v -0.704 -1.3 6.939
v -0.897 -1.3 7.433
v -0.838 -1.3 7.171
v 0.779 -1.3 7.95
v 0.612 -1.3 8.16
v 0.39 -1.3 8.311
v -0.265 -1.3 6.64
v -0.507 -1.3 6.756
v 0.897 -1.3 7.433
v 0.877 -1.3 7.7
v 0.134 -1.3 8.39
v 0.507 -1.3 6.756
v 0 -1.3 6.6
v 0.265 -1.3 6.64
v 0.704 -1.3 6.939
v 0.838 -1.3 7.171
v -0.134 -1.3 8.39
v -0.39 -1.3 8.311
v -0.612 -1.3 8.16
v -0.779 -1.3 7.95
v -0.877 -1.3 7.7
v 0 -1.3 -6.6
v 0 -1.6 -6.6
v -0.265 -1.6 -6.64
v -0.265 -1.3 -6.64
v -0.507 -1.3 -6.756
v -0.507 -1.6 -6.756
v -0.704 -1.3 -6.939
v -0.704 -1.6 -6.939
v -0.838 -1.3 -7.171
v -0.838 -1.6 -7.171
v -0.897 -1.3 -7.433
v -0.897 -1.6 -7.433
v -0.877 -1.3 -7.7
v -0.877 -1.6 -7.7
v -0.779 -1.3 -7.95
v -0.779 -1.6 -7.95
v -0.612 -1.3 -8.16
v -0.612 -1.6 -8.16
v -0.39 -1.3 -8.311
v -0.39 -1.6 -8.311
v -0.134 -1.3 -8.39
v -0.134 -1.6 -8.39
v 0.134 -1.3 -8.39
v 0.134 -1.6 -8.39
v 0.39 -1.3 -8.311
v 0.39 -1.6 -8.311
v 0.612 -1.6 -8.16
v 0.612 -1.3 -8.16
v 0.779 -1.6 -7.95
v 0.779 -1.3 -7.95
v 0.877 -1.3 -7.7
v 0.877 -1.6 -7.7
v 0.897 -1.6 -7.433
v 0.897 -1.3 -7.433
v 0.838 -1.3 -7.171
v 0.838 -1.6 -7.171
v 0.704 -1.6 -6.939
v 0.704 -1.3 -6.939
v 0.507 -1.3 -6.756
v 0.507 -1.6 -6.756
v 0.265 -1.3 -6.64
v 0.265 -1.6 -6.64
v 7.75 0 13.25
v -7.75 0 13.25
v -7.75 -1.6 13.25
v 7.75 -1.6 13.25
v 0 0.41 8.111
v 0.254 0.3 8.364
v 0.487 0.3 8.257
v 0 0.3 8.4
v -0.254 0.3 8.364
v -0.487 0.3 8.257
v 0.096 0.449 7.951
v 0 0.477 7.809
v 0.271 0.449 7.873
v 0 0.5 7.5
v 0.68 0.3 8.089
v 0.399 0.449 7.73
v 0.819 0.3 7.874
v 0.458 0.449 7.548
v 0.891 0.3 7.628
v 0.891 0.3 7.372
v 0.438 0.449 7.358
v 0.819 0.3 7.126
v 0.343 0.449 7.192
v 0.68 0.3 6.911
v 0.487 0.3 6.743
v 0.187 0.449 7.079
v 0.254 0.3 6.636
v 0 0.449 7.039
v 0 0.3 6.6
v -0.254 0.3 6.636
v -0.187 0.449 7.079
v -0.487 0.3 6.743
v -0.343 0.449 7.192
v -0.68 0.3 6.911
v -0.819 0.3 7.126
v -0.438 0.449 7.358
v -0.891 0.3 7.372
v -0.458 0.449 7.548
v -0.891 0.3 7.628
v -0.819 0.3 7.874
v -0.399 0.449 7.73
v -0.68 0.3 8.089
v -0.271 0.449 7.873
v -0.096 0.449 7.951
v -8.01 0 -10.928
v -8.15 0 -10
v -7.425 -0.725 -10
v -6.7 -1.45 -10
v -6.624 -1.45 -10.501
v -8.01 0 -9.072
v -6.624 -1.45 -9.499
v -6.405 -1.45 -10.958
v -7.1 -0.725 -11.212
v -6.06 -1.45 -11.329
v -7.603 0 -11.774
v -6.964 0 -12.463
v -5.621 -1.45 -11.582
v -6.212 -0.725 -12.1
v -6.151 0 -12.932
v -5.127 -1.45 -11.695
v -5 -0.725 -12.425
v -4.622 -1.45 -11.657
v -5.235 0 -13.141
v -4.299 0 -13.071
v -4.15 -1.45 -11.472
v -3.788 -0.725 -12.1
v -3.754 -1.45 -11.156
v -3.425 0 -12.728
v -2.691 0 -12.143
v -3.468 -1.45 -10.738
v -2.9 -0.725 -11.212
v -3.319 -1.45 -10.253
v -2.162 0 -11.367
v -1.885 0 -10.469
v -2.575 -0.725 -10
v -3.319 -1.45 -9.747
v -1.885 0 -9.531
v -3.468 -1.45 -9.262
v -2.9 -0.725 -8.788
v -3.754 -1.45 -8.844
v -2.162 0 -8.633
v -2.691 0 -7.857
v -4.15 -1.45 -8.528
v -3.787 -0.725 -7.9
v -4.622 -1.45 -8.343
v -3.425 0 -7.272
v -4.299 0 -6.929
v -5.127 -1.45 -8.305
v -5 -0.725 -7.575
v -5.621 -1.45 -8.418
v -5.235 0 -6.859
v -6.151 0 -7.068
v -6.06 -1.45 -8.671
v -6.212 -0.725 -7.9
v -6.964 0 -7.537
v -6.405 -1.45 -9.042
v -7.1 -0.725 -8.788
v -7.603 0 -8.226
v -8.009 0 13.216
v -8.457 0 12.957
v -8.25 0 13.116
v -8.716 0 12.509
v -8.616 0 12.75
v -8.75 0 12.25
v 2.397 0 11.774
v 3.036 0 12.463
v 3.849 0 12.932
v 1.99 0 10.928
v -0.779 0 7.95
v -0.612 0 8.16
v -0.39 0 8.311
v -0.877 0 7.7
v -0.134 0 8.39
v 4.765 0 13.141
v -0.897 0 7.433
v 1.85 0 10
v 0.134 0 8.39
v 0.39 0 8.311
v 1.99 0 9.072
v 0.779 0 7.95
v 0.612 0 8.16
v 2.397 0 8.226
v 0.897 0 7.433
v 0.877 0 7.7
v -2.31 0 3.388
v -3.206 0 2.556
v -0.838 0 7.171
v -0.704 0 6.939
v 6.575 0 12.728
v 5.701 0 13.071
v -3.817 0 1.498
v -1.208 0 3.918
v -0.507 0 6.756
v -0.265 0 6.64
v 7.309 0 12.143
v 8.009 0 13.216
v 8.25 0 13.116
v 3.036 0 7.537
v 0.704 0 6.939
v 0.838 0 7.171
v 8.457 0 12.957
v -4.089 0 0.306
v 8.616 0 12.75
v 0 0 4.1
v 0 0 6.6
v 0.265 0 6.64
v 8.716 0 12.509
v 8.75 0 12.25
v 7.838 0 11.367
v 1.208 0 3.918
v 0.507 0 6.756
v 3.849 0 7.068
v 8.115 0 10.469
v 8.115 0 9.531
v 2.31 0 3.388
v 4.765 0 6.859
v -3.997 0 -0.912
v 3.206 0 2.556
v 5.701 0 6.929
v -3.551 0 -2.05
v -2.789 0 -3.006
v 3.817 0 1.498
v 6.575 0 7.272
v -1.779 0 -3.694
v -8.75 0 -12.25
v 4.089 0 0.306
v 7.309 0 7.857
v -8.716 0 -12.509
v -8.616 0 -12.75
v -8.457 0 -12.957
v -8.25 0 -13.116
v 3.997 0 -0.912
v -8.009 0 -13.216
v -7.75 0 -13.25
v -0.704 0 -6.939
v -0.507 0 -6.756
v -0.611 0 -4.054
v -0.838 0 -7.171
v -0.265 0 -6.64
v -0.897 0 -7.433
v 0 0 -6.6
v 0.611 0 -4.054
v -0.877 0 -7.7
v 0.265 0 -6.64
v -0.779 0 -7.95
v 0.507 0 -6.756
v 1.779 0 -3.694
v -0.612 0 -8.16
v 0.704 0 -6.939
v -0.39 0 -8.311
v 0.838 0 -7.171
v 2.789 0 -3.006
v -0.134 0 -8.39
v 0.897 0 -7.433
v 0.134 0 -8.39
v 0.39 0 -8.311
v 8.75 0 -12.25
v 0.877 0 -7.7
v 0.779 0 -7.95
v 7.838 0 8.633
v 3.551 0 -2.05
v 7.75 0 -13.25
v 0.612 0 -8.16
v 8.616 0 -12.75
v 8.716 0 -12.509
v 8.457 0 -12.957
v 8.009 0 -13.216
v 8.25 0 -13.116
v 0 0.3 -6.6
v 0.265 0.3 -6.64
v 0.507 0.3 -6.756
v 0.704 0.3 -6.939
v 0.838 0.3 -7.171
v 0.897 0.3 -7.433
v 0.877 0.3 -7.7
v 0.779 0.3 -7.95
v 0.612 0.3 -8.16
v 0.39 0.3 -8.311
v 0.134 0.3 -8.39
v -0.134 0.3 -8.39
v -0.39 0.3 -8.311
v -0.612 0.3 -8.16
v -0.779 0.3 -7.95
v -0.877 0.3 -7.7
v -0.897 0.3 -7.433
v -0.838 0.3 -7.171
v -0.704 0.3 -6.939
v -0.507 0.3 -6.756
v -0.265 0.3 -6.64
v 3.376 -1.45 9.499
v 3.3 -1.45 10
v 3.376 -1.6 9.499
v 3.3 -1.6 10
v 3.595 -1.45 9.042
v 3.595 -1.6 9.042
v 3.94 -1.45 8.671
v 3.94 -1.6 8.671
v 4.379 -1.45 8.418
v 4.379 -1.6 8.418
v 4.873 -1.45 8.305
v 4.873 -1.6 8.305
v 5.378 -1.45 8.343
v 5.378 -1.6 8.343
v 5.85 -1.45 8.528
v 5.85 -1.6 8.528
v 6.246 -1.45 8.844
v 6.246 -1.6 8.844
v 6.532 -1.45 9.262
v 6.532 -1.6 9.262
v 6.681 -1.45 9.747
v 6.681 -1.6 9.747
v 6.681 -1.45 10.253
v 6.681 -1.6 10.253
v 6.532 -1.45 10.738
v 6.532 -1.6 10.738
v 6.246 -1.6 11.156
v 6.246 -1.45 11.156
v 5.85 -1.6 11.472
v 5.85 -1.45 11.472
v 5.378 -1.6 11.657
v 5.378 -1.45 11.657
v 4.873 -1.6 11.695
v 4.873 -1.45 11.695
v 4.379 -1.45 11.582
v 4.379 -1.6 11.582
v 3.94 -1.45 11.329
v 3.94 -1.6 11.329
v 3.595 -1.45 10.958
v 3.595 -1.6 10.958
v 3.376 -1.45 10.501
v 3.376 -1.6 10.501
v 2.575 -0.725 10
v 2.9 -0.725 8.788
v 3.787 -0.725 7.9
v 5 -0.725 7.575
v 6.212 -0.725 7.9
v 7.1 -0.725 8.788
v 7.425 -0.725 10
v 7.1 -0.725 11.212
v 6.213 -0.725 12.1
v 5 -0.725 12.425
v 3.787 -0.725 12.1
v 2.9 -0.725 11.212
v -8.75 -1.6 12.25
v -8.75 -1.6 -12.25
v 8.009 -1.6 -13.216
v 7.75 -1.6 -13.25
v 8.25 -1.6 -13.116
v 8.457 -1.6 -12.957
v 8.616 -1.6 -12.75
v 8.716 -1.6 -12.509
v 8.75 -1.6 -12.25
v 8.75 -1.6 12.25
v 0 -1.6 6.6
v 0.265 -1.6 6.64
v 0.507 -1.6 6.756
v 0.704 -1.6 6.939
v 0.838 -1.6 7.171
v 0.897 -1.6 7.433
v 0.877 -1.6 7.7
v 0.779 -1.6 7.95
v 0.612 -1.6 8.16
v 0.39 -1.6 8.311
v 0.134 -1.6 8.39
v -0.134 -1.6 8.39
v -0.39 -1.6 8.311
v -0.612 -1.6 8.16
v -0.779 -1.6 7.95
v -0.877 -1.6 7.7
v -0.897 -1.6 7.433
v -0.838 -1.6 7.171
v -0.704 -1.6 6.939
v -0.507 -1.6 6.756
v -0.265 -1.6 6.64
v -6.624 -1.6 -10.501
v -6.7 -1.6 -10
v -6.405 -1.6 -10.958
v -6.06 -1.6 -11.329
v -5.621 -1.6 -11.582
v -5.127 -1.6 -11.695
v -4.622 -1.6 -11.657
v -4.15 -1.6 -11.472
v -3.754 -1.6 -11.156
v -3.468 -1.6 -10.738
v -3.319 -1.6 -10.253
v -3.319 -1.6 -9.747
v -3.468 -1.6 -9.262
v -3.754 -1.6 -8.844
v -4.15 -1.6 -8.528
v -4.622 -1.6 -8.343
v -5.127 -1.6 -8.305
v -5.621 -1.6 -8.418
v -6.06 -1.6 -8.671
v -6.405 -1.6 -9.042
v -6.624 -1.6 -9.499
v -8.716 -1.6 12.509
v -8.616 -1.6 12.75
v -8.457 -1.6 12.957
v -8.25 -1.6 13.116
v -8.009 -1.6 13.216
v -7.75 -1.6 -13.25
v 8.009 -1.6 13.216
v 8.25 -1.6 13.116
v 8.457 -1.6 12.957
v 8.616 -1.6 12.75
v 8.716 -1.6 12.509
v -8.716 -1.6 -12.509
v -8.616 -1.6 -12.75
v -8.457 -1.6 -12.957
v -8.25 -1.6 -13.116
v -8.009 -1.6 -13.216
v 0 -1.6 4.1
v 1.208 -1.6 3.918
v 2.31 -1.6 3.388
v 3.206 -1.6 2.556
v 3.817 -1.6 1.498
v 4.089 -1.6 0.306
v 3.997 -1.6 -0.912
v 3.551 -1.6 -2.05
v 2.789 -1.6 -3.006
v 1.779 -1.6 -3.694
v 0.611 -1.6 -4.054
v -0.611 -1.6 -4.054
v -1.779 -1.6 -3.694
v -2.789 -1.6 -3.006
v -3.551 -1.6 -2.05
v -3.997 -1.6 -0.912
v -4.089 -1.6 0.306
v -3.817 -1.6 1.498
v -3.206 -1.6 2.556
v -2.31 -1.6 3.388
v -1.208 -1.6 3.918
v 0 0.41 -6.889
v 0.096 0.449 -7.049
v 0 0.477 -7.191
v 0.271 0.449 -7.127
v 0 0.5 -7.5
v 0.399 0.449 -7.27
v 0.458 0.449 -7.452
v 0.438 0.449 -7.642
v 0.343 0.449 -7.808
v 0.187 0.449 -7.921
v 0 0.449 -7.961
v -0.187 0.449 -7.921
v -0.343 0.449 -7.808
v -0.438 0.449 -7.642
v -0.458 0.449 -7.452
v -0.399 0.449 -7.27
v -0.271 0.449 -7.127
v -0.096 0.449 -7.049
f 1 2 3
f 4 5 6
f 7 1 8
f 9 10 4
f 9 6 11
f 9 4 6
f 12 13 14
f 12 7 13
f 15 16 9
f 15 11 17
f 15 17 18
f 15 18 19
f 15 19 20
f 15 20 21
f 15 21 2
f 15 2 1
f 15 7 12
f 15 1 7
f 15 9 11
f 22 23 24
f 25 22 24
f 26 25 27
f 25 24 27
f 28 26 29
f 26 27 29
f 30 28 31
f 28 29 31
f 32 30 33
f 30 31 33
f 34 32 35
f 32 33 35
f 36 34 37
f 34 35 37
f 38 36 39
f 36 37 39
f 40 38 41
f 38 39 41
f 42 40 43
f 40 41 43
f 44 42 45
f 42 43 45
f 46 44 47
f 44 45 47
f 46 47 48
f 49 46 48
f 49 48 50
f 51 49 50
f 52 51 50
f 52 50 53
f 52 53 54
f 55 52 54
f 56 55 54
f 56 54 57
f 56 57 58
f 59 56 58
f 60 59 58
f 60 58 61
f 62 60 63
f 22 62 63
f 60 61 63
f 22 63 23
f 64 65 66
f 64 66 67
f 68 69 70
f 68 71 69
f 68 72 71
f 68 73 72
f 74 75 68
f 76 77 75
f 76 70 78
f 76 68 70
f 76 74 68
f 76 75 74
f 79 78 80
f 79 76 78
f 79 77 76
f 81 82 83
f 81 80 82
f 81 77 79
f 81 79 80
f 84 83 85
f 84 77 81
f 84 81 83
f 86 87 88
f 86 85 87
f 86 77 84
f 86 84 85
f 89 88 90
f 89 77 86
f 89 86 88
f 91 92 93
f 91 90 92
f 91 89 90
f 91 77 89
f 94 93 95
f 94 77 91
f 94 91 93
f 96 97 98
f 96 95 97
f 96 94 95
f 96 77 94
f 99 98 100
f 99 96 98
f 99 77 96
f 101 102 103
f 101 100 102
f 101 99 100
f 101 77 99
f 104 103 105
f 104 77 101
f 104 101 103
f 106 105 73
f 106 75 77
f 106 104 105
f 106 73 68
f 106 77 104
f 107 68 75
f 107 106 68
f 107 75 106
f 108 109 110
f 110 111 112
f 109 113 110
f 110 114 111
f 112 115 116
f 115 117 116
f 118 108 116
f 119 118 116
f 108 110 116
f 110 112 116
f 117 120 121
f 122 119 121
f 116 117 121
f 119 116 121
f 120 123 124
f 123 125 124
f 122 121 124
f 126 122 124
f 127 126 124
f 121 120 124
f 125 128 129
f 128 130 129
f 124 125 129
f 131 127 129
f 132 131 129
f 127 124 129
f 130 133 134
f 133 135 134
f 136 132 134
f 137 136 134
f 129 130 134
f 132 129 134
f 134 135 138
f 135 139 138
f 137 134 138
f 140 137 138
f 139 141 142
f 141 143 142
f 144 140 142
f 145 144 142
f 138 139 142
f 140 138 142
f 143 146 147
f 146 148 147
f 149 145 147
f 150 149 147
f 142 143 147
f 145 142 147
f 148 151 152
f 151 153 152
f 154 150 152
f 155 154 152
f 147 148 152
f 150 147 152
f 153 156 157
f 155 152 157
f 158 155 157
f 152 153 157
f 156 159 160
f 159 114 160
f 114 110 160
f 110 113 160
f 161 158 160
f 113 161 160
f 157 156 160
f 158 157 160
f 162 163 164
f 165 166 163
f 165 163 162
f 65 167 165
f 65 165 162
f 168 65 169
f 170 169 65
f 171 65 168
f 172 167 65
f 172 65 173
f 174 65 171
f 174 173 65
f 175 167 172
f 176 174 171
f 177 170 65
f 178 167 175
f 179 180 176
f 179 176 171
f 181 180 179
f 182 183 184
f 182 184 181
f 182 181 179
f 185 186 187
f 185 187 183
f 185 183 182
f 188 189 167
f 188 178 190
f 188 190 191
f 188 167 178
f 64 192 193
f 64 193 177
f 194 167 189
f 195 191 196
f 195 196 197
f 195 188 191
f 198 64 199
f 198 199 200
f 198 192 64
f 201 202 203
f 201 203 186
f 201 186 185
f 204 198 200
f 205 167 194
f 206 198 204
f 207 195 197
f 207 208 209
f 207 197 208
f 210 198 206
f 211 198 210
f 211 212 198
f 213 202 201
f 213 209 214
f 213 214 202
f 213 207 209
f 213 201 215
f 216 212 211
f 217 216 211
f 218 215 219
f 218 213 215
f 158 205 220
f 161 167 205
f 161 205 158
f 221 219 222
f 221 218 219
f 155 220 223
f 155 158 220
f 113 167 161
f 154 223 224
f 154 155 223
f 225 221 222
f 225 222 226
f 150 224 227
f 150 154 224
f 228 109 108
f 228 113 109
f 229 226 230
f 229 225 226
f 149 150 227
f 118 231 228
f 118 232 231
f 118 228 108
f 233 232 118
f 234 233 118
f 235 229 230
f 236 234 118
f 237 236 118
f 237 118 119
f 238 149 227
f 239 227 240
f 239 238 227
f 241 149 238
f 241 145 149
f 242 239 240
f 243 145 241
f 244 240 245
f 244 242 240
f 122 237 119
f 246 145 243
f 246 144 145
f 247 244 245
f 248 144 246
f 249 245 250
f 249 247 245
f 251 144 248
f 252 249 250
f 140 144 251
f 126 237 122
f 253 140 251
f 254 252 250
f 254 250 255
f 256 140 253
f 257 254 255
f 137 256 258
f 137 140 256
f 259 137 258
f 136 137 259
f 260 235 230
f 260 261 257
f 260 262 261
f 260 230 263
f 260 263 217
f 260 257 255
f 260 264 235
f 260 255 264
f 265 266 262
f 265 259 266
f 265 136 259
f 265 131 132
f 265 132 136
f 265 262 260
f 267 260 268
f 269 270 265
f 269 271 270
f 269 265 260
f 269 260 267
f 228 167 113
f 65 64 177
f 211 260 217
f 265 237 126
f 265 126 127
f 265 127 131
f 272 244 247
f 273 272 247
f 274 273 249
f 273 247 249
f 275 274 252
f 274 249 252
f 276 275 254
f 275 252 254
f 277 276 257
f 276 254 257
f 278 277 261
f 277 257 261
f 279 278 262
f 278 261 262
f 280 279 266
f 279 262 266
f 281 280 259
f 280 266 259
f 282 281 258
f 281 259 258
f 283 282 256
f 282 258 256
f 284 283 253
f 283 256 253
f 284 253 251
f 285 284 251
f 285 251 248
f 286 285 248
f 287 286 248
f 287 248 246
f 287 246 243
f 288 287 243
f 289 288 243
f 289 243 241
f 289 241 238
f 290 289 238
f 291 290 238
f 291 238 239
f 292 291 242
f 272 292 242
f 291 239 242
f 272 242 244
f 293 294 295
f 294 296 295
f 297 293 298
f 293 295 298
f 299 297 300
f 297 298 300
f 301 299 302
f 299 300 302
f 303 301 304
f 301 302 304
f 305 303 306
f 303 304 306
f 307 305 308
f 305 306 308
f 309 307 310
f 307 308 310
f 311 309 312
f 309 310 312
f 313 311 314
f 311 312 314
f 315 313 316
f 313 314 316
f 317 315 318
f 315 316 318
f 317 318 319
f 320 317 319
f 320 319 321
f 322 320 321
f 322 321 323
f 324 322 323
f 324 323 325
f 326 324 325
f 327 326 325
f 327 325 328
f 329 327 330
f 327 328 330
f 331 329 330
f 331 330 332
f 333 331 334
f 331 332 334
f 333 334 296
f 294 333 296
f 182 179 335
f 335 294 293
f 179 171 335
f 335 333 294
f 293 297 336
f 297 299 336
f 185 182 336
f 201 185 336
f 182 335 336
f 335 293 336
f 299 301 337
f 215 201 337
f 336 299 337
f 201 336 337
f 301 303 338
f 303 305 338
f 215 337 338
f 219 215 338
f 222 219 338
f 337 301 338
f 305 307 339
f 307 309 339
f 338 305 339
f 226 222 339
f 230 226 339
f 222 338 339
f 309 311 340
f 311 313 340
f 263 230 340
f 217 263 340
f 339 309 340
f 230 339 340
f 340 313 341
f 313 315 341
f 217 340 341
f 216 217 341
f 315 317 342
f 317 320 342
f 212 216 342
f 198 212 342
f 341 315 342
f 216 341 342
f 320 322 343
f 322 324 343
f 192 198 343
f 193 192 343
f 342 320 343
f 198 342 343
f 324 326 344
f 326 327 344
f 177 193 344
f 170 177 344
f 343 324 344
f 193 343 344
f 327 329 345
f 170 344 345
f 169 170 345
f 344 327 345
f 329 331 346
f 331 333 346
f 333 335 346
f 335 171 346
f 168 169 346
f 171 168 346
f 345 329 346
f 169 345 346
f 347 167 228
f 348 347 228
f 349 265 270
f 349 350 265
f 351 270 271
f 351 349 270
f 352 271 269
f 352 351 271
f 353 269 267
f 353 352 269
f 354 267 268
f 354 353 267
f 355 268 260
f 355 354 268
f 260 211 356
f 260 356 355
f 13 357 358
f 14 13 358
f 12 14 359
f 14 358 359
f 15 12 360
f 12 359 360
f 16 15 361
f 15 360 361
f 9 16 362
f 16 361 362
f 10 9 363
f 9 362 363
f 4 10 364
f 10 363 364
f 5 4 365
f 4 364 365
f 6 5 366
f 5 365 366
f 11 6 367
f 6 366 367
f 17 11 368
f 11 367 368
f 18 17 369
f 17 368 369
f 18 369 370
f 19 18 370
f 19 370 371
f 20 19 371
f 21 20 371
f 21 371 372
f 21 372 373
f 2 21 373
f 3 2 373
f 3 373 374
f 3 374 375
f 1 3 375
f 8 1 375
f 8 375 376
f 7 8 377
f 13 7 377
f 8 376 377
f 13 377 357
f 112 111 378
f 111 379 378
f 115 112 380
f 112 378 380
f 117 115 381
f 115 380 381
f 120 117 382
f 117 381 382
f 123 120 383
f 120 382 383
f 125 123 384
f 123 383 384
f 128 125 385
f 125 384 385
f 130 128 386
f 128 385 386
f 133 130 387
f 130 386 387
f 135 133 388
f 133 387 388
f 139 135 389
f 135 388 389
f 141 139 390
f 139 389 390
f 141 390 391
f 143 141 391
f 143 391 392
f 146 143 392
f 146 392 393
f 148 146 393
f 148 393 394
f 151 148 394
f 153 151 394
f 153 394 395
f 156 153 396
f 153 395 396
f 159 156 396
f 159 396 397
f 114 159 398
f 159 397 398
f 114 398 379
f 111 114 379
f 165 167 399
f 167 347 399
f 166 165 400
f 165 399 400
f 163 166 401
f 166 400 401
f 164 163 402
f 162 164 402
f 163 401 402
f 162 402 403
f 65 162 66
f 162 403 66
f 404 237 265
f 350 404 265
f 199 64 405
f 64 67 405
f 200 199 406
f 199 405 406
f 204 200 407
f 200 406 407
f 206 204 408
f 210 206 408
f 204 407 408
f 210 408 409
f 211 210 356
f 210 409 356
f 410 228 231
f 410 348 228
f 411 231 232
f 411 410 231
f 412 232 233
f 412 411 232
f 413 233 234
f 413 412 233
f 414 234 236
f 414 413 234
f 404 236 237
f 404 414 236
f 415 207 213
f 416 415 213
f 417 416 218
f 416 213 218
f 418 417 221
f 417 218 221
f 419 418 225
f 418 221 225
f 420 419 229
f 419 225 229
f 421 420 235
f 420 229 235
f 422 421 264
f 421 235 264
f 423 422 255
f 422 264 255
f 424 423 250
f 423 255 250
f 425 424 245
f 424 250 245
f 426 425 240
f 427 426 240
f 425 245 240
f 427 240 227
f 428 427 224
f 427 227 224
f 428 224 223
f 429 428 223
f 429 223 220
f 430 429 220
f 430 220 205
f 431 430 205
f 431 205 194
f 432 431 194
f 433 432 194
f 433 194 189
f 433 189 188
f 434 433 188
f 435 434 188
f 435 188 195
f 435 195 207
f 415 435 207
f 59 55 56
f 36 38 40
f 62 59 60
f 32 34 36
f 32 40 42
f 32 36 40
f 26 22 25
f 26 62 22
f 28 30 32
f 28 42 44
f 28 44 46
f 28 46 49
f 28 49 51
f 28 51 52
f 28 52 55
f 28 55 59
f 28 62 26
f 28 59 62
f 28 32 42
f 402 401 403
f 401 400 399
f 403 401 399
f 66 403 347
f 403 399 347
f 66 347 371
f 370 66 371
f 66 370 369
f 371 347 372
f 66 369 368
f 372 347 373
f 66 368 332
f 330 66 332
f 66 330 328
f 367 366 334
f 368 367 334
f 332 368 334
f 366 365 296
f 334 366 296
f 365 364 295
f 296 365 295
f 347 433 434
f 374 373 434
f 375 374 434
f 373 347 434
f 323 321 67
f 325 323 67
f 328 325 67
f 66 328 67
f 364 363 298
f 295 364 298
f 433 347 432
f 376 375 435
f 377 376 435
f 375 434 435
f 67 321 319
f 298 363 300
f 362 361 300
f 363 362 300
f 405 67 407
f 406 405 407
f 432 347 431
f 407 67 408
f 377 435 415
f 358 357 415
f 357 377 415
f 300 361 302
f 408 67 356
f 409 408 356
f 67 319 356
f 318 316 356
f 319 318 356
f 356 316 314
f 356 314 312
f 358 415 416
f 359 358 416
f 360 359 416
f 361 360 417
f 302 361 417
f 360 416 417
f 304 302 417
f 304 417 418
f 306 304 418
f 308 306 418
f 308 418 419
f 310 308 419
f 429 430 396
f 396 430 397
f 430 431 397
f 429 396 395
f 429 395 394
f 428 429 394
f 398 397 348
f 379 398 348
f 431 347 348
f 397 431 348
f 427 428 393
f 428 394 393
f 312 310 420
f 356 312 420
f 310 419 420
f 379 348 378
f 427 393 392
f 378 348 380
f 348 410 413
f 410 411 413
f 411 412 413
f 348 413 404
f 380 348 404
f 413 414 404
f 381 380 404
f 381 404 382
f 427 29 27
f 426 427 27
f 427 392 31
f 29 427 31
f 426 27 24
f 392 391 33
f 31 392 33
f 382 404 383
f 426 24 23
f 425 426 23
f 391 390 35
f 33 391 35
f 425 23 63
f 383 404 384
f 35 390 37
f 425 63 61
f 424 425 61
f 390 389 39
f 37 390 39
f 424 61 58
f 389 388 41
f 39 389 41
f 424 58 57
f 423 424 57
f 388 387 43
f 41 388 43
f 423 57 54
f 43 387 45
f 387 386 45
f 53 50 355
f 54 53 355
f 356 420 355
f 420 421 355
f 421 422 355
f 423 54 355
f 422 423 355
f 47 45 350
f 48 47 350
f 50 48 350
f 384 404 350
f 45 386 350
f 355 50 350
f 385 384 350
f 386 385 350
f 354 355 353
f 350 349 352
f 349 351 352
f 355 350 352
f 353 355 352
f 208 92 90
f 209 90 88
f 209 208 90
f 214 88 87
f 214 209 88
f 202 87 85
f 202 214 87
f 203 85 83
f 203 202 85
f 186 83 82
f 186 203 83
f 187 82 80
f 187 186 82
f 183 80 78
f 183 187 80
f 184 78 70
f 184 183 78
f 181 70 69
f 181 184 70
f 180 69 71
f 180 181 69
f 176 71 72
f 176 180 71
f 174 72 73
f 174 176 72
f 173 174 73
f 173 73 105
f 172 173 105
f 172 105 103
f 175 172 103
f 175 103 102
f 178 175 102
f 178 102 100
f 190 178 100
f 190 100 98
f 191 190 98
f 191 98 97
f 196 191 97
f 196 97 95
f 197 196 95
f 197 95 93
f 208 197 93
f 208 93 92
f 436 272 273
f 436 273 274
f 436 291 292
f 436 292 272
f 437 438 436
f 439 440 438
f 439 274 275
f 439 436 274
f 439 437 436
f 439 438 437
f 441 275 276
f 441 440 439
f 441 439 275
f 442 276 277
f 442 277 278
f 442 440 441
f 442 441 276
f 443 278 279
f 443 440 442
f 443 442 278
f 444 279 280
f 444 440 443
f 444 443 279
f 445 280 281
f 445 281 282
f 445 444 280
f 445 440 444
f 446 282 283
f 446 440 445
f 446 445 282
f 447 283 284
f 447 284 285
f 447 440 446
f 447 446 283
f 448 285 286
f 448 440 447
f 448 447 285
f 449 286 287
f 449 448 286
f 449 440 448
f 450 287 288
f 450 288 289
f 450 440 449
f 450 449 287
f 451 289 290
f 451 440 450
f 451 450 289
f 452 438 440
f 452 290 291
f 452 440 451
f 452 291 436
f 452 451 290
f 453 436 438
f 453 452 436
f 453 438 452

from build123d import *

# Parameters (mm, degrees)
BASES_W                                         = 17.5
BASES_H                                         = 26.5
BASE_DEPTH                                      = 1.6
CSK_FOR_M3_FLAT_HEAD_MACHINE_SCREW1_D           = 3.4
CSK_FOR_M3_FLAT_HEAD_MACHINE_SCREW1_DEPTH       = 11
CSK_FOR_M3_FLAT_HEAD_MACHINE_SCREW1_CSINK_D     = 6.3
CSK_FOR_M3_FLAT_HEAD_MACHINE_SCREW1_CSINK_ANGLE = 90
CSK_FOR_M3_FLAT_HEAD_MACHINE_SCREW1_TIP         = 1.021463052
BORES_R                                         = 4.1
BORE_DEPTH                                      = 16.958853342
LOCKINGFEATURES_R                               = 0.9
LOCKING_FEATURE_DEPTH                           = 0.3
LF_DOME_FACE_RADIUS                             = 0.9
LF_DOME_HEIGHT                                  = 0.2
LF_HM_COPY_1_FACE_RADIUS                        = 0.9
LF_HM_COPY_1_HEIGHT                             = 0.2
LFBOTTOMCUT_R                                   = 0.9
LF_BOTTOM_CUT_DEPTH                             = 0.3
BASE_FILLET_R                                   = 1


with BuildPart() as part:
    # BaseS → BASE (new body)
    with BuildSketch(Plane(origin=(0, 0, 0), x_dir=(1, 0, 0), z_dir=(0, 1, 0))):
        Rectangle(BASES_W, BASES_H)
    extrude(amount=-BASE_DEPTH)

    # CSK for M3 Flat Head Machine Screw1
    with Locations(Plane(origin=(0, 0, 0), x_dir=(1, 0, 0), z_dir=(0, 1, 0))):
        with Locations((-5, 10), (5, -10)):
            CounterSinkHole(CSK_FOR_M3_FLAT_HEAD_MACHINE_SCREW1_D / 2, CSK_FOR_M3_FLAT_HEAD_MACHINE_SCREW1_CSINK_D / 2, depth=CSK_FOR_M3_FLAT_HEAD_MACHINE_SCREW1_DEPTH, counter_sink_angle=CSK_FOR_M3_FLAT_HEAD_MACHINE_SCREW1_CSINK_ANGLE)
            with Locations((0, 0, -(CSK_FOR_M3_FLAT_HEAD_MACHINE_SCREW1_DEPTH + CSK_FOR_M3_FLAT_HEAD_MACHINE_SCREW1_TIP / 2))):  # 118° drill point
                Cone(0, CSK_FOR_M3_FLAT_HEAD_MACHINE_SCREW1_D / 2, CSK_FOR_M3_FLAT_HEAD_MACHINE_SCREW1_TIP, mode=Mode.SUBTRACT)

    # BoreS → BORE (cut, through all)
    with BuildSketch(Plane(origin=(0, 0, 0), x_dir=(1, 0, 0), z_dir=(0, 1, 0))):
        with Locations(Location((0, 0, 0), (0, 0, 270))):
            Circle(BORES_R)
    extrude(amount=-BORE_DEPTH, mode=Mode.SUBTRACT)

    # LockingFeatureS → LOCKING FEATURE (add)
    with BuildSketch(Plane(origin=(0, 0, 0), x_dir=(1, 0, 0), z_dir=(0, 1, 0))):
        with Locations(Location((0, 7.5, 0), (0, 0, 270))):
            Circle(LOCKINGFEATURES_R)
    locking_feature = extrude(amount=LOCKING_FEATURE_DEPTH)

    # LF DOME: a dome of height H over a round flat face of radius A is a cap of a sphere of radius (A * A + H * H) / (2 * H)
    lf_dome_r = (LF_DOME_FACE_RADIUS * LF_DOME_FACE_RADIUS + LF_DOME_HEIGHT * LF_DOME_HEIGHT) / (2 * LF_DOME_HEIGHT)
    lf_dome_base = Plane((0, 0.3, -7.5), z_dir=(0, 1, 0))
    with Locations(lf_dome_base.offset(LF_DOME_HEIGHT - lf_dome_r)):
        lf_dome_ball = Sphere(lf_dome_r, mode=Mode.PRIVATE)
    add(split(lf_dome_ball, bisect_by=lf_dome_base, keep=Keep.TOP, mode=Mode.PRIVATE))

    # LF HM: LOCKING FEATURE across plane
    add(locking_feature.mirror(Plane.XY))

    # LF HM copy 1: a dome of height H over a round flat face of radius A is a cap of a sphere of radius (A * A + H * H) / (2 * H)
    lf_hm_copy_1_r = (LF_HM_COPY_1_FACE_RADIUS * LF_HM_COPY_1_FACE_RADIUS + LF_HM_COPY_1_HEIGHT * LF_HM_COPY_1_HEIGHT) / (2 * LF_HM_COPY_1_HEIGHT)
    lf_hm_copy_1_base = Plane((0, 0.3, 7.5), z_dir=(0, 1, 0))
    with Locations(lf_hm_copy_1_base.offset(LF_HM_COPY_1_HEIGHT - lf_hm_copy_1_r)):
        lf_hm_copy_1_ball = Sphere(lf_hm_copy_1_r, mode=Mode.PRIVATE)
    add(split(lf_hm_copy_1_ball, bisect_by=lf_hm_copy_1_base, keep=Keep.TOP, mode=Mode.PRIVATE))

    # LFBottomCut → LF BOTTOM CUT (cut)
    with BuildSketch(Plane(origin=(0, -1.6, 0), x_dir=(-1, 0, 0), z_dir=(0, -1, 0))):
        with Locations(Location((0, 7.5, 0), (0, 0, 270))):
            Circle(LFBOTTOMCUT_R)
        with Locations(Location((0, -7.5, 0), (0, 0, 90))):
            Circle(LFBOTTOMCUT_R)
    extrude(amount=-LF_BOTTOM_CUT_DEPTH, mode=Mode.SUBTRACT)

    # BASE FILLET
    base_fillet_edges = [part.edges().sort_by_distance(p)[0] for p in [
        (8.75, -0.8, 13.25),
        (-8.75, -0.8, 13.25),
        (-8.75, -0.8, -13.25),
        (8.75, -0.8, -13.25),
    ]]
    fillet(base_fillet_edges, radius=BASE_FILLET_R)


solid = part.part
